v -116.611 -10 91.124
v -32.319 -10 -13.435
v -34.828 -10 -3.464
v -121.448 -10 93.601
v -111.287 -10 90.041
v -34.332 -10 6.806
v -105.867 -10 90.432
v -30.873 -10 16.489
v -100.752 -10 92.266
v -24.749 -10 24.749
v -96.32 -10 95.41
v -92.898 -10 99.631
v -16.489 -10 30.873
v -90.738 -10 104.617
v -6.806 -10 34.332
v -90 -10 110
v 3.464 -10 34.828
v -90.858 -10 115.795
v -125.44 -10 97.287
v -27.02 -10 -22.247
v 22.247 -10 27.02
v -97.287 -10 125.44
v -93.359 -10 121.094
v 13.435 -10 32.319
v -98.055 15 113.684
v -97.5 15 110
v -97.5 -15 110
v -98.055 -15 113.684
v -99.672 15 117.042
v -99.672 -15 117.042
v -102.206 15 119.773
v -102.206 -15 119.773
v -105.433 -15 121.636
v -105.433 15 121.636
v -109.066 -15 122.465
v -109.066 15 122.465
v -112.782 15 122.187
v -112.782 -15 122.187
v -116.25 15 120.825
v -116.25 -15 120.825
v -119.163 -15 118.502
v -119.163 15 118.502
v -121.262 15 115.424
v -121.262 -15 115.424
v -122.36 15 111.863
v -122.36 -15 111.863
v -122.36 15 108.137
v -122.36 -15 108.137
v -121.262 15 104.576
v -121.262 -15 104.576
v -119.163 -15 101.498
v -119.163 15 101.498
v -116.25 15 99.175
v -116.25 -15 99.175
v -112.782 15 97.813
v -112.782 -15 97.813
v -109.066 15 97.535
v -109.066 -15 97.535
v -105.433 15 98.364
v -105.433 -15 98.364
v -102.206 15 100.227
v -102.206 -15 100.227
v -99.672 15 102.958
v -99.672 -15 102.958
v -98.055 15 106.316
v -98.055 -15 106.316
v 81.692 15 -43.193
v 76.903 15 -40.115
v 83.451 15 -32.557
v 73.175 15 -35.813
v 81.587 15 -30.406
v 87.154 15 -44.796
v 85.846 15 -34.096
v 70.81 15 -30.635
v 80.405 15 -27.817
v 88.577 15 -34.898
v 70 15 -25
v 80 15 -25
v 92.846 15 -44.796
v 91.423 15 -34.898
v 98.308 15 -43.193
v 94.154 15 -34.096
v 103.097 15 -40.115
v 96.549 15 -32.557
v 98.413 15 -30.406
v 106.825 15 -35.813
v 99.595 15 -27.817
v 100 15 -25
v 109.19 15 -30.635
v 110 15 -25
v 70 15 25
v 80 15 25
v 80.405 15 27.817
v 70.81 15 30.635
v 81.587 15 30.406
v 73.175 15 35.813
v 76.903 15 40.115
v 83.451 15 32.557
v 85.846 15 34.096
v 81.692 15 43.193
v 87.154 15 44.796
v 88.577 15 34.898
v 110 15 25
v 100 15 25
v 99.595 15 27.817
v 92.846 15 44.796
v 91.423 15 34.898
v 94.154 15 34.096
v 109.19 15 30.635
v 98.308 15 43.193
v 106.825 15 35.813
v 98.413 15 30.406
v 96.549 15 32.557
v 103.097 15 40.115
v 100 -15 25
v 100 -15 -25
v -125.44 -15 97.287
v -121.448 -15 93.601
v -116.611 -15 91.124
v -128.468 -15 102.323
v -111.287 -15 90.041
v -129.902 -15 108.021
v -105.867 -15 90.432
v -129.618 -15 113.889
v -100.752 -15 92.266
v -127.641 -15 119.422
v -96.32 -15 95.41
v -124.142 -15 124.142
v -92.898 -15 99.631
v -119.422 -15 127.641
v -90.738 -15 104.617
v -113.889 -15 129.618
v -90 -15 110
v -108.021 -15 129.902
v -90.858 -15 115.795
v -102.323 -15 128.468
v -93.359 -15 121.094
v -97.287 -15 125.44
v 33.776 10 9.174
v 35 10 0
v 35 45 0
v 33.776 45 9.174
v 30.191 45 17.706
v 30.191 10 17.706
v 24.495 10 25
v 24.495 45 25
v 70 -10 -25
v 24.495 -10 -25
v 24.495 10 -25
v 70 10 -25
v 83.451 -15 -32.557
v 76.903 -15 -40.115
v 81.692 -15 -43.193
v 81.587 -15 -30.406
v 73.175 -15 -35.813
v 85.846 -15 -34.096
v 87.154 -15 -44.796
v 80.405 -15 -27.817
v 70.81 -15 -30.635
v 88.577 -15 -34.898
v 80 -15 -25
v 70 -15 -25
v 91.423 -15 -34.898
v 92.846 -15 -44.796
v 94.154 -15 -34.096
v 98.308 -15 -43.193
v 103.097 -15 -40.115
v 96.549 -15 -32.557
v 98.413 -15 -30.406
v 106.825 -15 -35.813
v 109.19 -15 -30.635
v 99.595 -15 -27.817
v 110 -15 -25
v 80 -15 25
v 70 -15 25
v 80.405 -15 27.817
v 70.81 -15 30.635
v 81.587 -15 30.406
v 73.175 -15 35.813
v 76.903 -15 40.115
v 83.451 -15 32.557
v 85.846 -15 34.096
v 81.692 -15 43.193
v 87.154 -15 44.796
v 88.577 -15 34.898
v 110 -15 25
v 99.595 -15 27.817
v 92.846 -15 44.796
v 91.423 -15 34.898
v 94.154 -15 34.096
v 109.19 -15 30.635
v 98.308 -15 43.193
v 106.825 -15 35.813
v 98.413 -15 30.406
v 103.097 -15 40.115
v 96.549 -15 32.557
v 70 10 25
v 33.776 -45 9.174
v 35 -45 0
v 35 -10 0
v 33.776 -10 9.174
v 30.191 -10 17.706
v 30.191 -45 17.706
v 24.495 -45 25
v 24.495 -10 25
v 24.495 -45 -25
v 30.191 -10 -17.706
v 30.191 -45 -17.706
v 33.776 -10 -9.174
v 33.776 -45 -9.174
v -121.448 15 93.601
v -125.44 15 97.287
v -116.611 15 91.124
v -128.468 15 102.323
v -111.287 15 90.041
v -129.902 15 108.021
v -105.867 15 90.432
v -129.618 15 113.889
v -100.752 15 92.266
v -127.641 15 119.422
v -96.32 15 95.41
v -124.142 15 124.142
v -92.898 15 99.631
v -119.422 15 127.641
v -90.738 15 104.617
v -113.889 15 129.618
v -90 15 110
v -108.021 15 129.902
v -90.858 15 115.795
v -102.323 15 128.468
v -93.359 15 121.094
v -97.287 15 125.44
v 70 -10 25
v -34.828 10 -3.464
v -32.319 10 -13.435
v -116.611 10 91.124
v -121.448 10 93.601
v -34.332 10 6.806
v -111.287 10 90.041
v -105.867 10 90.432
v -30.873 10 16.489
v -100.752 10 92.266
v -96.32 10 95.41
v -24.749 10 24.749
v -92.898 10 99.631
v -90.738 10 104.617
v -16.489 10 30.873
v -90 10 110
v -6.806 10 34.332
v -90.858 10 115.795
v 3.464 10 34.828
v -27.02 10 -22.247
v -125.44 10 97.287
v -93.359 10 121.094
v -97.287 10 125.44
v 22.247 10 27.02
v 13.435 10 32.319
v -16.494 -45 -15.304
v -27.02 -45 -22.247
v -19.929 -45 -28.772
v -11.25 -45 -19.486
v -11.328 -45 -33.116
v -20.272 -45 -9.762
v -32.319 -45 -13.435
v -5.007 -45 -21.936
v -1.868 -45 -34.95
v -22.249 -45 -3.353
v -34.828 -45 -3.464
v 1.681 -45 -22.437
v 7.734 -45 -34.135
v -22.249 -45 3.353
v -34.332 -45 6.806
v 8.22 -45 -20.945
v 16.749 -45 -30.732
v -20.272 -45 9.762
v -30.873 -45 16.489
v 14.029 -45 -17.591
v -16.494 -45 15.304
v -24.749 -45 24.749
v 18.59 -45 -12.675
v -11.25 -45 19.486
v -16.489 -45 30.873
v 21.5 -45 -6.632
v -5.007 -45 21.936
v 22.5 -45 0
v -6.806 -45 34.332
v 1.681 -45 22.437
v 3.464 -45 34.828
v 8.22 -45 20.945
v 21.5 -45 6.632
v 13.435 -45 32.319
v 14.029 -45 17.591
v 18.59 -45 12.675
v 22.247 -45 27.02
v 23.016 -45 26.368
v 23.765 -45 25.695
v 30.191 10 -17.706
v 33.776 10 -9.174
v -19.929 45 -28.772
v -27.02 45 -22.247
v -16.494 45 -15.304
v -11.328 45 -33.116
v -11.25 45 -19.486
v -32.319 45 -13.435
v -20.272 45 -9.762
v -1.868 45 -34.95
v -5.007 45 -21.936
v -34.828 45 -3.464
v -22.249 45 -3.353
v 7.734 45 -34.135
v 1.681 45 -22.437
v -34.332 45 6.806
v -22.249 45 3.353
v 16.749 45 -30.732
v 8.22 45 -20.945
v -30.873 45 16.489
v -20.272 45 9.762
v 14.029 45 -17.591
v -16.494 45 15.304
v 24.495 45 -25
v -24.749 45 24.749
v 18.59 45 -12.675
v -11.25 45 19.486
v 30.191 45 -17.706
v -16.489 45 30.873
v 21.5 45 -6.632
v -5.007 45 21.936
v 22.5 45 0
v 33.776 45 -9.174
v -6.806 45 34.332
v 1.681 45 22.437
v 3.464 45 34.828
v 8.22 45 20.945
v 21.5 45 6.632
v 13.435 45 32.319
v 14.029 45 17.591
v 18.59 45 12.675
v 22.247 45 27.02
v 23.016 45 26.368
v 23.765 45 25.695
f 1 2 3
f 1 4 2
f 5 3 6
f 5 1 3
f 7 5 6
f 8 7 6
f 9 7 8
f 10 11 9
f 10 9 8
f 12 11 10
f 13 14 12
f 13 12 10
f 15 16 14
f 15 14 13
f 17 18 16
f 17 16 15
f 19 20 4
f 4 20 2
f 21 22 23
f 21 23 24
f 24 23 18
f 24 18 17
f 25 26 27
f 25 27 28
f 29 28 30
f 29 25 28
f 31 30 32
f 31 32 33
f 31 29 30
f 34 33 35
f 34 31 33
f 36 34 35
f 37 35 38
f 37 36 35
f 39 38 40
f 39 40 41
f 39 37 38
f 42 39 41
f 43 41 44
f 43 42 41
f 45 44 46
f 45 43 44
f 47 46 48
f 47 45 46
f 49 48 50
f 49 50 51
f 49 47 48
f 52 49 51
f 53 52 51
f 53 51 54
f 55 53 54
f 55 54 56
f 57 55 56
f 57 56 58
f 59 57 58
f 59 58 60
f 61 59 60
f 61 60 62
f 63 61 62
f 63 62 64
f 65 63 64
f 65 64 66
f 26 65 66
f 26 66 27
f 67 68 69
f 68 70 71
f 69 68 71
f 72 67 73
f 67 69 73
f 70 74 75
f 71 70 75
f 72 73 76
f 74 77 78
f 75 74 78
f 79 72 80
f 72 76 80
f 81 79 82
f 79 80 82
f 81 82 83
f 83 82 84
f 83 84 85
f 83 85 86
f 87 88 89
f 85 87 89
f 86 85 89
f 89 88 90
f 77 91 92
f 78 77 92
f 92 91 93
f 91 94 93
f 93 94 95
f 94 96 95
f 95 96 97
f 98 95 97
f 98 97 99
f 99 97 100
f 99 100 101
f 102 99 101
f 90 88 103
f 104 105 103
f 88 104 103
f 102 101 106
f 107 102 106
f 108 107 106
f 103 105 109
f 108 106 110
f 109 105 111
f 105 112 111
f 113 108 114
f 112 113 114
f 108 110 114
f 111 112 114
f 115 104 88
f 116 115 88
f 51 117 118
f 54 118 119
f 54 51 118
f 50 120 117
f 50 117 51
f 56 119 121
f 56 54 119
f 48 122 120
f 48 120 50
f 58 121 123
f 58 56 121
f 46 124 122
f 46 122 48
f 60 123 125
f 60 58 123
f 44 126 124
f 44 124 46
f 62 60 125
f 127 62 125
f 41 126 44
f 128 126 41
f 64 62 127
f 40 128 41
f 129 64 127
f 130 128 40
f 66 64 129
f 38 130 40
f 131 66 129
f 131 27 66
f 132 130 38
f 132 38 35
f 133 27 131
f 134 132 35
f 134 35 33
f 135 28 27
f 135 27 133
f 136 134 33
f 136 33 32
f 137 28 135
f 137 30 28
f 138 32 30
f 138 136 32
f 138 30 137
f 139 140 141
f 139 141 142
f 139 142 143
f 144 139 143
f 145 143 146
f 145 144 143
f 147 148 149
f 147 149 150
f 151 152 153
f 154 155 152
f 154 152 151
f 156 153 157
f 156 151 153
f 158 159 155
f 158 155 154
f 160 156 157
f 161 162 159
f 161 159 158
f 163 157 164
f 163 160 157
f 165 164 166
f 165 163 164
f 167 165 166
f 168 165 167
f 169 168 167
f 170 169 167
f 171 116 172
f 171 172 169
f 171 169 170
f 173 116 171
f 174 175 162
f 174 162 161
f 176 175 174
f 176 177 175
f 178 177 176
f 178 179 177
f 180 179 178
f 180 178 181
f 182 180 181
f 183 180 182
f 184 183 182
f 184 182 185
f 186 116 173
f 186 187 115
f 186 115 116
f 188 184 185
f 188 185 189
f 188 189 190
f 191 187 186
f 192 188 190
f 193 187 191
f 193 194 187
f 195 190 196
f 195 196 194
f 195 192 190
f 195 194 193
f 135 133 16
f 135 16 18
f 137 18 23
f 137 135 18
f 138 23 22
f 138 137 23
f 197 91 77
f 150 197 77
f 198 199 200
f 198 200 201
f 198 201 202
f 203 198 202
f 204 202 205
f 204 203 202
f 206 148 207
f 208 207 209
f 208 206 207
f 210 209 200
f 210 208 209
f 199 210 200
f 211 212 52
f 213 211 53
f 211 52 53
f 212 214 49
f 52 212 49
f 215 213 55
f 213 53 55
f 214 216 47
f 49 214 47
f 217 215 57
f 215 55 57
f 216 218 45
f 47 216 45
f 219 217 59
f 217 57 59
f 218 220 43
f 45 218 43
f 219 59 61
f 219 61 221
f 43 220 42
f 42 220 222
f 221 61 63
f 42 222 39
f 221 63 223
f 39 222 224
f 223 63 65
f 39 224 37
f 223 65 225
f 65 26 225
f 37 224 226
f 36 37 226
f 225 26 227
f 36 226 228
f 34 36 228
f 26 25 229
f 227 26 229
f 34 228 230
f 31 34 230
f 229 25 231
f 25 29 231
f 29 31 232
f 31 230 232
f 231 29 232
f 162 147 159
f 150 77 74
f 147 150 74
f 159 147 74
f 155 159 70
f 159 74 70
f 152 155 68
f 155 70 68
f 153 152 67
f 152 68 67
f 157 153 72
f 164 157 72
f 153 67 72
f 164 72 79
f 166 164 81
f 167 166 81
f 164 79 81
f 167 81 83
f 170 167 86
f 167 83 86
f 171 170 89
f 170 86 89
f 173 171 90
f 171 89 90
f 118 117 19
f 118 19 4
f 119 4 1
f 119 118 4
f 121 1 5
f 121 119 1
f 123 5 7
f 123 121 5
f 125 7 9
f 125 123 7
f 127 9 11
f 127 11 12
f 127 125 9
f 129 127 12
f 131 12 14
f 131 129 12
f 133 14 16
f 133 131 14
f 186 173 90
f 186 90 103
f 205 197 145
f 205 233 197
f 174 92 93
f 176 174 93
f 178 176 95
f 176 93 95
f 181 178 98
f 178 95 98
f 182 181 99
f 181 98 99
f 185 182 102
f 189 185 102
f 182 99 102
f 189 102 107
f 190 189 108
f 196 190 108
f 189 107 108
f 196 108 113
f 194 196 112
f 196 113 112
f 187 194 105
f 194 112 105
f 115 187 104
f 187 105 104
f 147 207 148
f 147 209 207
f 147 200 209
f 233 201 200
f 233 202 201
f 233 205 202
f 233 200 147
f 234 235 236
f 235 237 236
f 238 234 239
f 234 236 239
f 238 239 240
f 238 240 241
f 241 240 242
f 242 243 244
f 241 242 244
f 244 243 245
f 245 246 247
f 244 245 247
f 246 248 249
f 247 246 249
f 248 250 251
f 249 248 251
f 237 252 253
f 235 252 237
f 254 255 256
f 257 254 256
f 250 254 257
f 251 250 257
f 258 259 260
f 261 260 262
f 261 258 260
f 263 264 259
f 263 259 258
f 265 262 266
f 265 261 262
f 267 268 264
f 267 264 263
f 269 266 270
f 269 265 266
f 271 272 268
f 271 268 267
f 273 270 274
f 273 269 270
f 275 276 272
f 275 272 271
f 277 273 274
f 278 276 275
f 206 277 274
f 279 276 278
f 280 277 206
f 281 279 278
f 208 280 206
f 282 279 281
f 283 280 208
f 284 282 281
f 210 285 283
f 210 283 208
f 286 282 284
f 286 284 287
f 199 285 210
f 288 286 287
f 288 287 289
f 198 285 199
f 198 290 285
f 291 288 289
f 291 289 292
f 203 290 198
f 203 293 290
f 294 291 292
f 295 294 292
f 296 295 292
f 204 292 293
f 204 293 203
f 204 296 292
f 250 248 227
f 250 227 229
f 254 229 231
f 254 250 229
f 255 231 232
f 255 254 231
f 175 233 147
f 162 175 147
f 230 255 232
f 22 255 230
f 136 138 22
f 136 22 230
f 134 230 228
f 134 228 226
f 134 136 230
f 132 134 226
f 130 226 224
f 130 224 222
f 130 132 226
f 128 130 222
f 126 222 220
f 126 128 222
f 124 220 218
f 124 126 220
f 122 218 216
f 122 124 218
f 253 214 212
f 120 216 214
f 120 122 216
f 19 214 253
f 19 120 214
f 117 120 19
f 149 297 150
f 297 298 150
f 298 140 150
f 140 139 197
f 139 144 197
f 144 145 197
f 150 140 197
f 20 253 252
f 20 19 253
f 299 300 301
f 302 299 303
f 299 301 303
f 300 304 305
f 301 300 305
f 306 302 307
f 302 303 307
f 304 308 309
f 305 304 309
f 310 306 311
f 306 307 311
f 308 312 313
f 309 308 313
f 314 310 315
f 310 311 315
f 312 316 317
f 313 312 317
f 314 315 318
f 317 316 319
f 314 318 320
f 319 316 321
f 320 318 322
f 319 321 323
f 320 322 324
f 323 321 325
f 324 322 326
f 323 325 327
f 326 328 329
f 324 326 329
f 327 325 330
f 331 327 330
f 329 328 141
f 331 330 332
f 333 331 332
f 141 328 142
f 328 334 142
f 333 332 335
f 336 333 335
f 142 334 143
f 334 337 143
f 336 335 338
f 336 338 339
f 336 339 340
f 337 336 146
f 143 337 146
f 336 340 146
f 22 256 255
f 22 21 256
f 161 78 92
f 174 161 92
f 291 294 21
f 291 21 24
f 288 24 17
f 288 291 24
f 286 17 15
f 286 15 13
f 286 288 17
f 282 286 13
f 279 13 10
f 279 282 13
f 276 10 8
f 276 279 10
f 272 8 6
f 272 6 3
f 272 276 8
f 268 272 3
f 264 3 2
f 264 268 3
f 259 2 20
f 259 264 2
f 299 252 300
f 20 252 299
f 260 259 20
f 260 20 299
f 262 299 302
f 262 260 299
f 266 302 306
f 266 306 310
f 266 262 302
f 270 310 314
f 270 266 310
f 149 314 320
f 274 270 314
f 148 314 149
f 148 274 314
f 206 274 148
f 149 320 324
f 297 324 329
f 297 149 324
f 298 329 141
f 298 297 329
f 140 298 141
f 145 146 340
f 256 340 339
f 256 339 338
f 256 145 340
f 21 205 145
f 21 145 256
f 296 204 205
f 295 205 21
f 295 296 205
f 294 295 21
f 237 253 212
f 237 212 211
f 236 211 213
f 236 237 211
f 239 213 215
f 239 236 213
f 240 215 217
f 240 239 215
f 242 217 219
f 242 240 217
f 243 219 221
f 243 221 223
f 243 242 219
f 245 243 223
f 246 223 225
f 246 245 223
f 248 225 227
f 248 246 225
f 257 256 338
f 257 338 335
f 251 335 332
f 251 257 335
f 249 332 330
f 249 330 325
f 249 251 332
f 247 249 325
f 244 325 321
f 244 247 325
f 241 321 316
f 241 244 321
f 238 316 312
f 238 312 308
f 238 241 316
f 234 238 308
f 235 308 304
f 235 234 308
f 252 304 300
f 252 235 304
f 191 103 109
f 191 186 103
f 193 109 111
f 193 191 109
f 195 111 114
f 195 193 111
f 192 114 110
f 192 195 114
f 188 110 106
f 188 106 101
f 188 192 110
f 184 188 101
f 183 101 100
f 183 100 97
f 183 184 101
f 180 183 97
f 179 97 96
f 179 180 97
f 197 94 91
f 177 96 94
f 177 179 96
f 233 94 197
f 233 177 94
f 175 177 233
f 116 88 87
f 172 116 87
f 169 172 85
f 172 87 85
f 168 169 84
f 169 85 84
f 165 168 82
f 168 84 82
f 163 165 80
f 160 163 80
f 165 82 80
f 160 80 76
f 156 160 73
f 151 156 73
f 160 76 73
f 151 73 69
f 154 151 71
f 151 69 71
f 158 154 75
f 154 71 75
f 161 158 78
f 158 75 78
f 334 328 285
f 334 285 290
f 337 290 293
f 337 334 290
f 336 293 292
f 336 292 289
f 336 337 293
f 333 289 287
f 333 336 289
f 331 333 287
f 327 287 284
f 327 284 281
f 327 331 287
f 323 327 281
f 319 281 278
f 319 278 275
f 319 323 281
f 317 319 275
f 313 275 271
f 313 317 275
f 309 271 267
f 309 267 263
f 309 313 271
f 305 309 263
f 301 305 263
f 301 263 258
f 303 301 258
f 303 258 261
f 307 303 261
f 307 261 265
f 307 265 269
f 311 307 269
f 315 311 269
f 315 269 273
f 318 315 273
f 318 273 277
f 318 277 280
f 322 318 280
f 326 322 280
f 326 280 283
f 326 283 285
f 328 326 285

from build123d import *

# Parameters (mm, degrees)
F0_R     = 12.5
F0_R_2   = 22.5
F1_DEPTH = 10
F2_DEPTH = 15
F3_DEPTH = 45


with BuildPart() as f1:
    # F0 (on Front) → F1 (new body, symmetric)
    with BuildSketch(Plane.XZ):
        with BuildLine():
            ThreePointArc((-97.287398, 125.439875), (-91.913374, 118.536626), (-90, 110))
            ThreePointArc((-90, 110), (-103.24713, 91.174519), (-125.439875, 97.287398))
            Line((-125.439875, 97.287398), (-27.019781, -22.247054))
            ThreePointArc((-27.019781, -22.247054), (-24.748737, 24.748738), (22.247054, 27.019781))
            Line((22.247054, 27.019781), (-97.287398, 125.439875))
        make_face()
        with BuildLine():
            Line((24.700145, 25), (24.494897, 25))
            ThreePointArc((24.494897, 25), (32.267022, 13.558735), (35, 0))
            ThreePointArc((35, 0), (32.267022, -13.558735), (24.494897, -25))
            Line((24.494897, -25), (70, -25))
            Line((70, -25), (70, 25))
            Line((70, 25), (24.700145, 25))
        make_face()
        with BuildLine():
            ThreePointArc((-125.439875, 97.287398), (-103.24713, 91.174519), (-90, 110))
            ThreePointArc((-90, 110), (-91.913374, 118.536626), (-97.287398, 125.439875))
            ThreePointArc((-97.287398, 125.439875), (-124.142136, 124.142136), (-125.439875, 97.287398))
        make_face()
        with Locations((-110, 110)):
            Circle(F0_R, mode=Mode.SUBTRACT)
        with BuildLine():
            ThreePointArc((24.494897, 25), (23.392785, 26.034162), (22.247054, 27.019781))
            ThreePointArc((22.247054, 27.019781), (-24.748737, 24.748738), (-27.019781, -22.247054))
            ThreePointArc((-27.019781, -22.247054), (-1.867736, -34.95013), (24.494897, -25))
            ThreePointArc((24.494897, -25), (32.267022, -13.558735), (35, 0))
            ThreePointArc((35, 0), (32.267022, 13.558735), (24.494897, 25))
        make_face()
        Circle(F0_R_2, mode=Mode.SUBTRACT)
        with BuildLine():
            ThreePointArc((110, 25), (90, 45), (70, 25))
            Line((70, 25), (70, -25))
            ThreePointArc((70, -25), (90, -45), (110, -25))
            Line((110, -25), (110, 25))
        make_face()
        with BuildLine():
            ThreePointArc((80, 25), (90, 35), (100, 25))
            Line((100, 25), (100, -25))
            ThreePointArc((100, -25), (90, -35), (80, -25))
            Line((80, -25), (80, 25))
        make_face(mode=Mode.SUBTRACT)
    extrude(amount=F1_DEPTH, both=True)

    # F0 (on Front) → F2 (join, symmetric)
    with BuildSketch(Plane.XZ):
        with BuildLine():
            ThreePointArc((110, 25), (90, 45), (70, 25))
            Line((70, 25), (70, -25))
            ThreePointArc((70, -25), (90, -45), (110, -25))
            Line((110, -25), (110, 25))
        make_face()
        with BuildLine():
            ThreePointArc((80, 25), (90, 35), (100, 25))
            Line((100, 25), (100, -25))
            ThreePointArc((100, -25), (90, -35), (80, -25))
            Line((80, -25), (80, 25))
        make_face(mode=Mode.SUBTRACT)
        with BuildLine():
            ThreePointArc((-125.439875, 97.287398), (-103.24713, 91.174519), (-90, 110))
            ThreePointArc((-90, 110), (-91.913374, 118.536626), (-97.287398, 125.439875))
            ThreePointArc((-97.287398, 125.439875), (-124.142136, 124.142136), (-125.439875, 97.287398))
        make_face()
        with Locations((-110, 110)):
            Circle(F0_R, mode=Mode.SUBTRACT)
    extrude(amount=F2_DEPTH, both=True)

    # F0 (on Front) → F3 (join, symmetric)
    with BuildSketch(Plane.XZ):
        with BuildLine():
            ThreePointArc((24.494897, 25), (23.392785, 26.034162), (22.247054, 27.019781))
            ThreePointArc((22.247054, 27.019781), (-24.748737, 24.748738), (-27.019781, -22.247054))
            ThreePointArc((-27.019781, -22.247054), (-1.867736, -34.95013), (24.494897, -25))
            ThreePointArc((24.494897, -25), (32.267022, -13.558735), (35, 0))
            ThreePointArc((35, 0), (32.267022, 13.558735), (24.494897, 25))
        make_face()
        Circle(F0_R_2, mode=Mode.SUBTRACT)
    extrude(amount=F3_DEPTH, both=True)


solid = f1.part
